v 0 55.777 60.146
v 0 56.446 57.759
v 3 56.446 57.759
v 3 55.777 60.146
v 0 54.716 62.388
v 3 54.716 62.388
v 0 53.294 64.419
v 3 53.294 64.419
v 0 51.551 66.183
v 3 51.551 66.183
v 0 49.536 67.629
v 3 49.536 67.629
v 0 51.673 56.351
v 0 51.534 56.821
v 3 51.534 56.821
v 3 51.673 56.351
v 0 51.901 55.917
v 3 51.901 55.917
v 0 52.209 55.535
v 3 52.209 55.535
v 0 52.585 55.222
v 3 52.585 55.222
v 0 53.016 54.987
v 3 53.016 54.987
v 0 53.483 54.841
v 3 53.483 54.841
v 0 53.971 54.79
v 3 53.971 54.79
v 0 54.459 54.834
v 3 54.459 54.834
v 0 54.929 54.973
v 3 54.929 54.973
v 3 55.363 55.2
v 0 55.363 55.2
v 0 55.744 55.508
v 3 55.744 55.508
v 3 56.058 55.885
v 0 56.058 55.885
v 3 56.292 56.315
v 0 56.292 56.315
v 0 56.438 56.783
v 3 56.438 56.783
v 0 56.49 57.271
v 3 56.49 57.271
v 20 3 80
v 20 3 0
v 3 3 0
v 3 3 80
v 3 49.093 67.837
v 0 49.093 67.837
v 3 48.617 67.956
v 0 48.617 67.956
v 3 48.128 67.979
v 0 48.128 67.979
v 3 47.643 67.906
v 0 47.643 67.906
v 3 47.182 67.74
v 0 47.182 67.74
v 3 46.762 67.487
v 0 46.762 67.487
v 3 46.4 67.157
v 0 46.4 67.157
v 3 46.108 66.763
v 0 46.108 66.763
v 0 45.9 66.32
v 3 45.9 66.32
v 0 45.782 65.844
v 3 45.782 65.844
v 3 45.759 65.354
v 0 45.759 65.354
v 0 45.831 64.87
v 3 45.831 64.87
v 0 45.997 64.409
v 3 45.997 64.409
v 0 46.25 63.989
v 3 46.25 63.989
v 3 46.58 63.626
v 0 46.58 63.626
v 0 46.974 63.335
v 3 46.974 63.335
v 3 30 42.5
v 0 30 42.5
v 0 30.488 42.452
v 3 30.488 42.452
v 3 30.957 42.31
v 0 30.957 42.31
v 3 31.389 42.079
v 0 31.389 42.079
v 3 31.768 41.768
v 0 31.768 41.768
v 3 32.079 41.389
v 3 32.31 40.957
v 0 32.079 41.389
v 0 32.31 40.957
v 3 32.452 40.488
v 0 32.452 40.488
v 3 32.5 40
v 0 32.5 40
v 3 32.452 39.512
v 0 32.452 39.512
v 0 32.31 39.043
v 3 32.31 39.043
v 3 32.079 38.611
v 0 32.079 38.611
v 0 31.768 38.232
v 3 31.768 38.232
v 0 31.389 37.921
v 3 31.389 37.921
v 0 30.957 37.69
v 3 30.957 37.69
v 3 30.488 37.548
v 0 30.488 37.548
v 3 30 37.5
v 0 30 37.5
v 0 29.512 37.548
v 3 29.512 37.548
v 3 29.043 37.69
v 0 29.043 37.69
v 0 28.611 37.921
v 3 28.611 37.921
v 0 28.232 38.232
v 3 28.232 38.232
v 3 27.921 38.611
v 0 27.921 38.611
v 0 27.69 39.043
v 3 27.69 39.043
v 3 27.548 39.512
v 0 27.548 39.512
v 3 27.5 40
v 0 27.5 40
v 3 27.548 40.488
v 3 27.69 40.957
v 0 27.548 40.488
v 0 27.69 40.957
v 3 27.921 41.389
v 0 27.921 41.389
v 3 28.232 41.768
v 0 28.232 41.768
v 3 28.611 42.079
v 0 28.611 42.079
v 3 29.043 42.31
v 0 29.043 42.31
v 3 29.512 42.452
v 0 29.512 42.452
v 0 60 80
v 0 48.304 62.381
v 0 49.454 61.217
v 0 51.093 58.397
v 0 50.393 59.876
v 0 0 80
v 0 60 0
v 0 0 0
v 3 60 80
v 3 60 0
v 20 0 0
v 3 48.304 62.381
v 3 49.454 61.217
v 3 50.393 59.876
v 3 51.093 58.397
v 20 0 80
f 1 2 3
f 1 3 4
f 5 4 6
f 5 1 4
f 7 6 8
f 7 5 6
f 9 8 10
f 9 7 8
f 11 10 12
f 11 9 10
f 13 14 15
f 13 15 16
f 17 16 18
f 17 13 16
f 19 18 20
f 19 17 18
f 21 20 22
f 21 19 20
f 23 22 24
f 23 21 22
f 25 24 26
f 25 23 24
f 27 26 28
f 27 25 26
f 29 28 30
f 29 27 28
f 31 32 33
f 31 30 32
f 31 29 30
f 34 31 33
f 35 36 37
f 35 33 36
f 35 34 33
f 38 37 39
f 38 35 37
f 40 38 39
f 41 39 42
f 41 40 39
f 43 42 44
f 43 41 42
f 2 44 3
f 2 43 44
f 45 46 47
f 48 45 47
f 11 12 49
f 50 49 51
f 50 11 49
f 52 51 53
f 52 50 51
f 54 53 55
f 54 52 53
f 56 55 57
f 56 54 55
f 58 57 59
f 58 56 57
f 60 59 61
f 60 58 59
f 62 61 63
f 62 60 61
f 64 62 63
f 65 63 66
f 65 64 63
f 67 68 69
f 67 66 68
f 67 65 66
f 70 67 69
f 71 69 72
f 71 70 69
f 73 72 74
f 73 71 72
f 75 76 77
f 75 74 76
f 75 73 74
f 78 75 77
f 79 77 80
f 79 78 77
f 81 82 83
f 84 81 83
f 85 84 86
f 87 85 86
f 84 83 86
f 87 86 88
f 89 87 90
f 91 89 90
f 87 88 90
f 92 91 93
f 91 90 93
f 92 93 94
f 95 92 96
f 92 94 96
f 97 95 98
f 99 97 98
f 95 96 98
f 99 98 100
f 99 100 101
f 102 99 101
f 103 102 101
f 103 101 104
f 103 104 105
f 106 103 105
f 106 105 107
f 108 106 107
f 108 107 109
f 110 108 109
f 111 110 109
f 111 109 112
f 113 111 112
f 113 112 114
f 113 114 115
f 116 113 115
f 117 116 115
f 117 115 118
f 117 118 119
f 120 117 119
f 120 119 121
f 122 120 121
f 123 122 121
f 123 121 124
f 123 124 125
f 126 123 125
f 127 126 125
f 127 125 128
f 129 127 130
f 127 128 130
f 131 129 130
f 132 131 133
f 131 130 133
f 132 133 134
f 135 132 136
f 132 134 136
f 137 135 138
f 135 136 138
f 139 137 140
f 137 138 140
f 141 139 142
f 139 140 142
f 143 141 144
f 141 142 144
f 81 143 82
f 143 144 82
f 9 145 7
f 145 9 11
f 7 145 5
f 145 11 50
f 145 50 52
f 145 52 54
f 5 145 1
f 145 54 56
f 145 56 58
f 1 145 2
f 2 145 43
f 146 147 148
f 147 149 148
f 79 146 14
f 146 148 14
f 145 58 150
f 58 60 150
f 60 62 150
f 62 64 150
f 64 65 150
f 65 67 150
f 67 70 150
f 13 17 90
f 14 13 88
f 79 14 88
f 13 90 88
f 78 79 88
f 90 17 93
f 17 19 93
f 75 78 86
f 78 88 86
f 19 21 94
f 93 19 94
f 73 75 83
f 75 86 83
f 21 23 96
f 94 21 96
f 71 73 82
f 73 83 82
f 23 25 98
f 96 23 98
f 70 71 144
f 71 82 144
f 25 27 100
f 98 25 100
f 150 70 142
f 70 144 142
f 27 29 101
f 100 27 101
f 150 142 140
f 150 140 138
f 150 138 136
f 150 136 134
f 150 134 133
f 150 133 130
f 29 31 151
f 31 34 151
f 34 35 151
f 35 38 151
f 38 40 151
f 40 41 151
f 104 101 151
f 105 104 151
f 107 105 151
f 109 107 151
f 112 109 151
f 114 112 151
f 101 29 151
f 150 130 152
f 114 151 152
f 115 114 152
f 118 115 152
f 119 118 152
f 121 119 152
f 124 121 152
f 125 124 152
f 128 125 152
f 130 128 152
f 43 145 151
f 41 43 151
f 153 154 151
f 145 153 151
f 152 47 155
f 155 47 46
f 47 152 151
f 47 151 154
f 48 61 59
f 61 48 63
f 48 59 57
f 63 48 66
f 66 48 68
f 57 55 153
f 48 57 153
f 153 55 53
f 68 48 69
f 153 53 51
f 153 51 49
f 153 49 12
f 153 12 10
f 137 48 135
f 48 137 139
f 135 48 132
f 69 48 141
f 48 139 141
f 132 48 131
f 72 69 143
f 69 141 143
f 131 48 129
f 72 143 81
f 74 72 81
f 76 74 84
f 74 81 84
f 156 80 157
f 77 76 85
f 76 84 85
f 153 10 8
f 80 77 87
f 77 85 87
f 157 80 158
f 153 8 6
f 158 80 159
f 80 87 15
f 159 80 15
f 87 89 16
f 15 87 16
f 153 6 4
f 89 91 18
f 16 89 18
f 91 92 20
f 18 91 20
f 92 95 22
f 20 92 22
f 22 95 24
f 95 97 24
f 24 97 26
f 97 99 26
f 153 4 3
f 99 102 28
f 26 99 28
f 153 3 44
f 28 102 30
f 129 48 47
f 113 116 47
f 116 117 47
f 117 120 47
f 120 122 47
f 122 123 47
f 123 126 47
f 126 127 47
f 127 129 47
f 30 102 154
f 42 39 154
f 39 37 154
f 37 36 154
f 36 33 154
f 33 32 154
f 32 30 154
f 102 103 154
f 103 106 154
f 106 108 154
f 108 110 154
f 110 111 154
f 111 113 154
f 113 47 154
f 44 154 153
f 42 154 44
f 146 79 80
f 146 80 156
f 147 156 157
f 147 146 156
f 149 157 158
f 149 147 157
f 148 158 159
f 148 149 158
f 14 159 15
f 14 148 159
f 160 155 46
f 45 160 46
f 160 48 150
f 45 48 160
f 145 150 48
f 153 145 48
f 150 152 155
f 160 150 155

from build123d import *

# Parameters (mm, degrees)
BOSS_EXTRUDE1_DEPTH = 80
SKETCH2_R           = 2.5
CUT_EXTRUDE1_DEPTH  = 21
CUT_EXTRUDE2_DEPTH  = 10


with BuildPart() as part:
    # Sketch1 → Boss-Extrude1 (new body)
    with BuildSketch(Plane.XY):
        Polygon((0, 0), (20, 0), (20, 3), (3, 3), (3, 60), (0, 60), align=None)
    extrude(amount=BOSS_EXTRUDE1_DEPTH)

    # Sketch2 → Cut-Extrude1 (cut, through all)
    with BuildSketch(Plane.ZY):
        with Locations((40, 30)):
            Circle(SKETCH2_R)
    extrude(amount=-CUT_EXTRUDE1_DEPTH, mode=Mode.SUBTRACT)

    # Sketch3 → Cut-Extrude2 (cut)
    with BuildSketch(Plane.ZY):
        with BuildLine():
            ThreePointArc((57.758584744, 56.445517931), (63.433655861, 54.048079801), (67.628756298, 49.536397843))
            ThreePointArc((67.628756298, 49.536397843), (66.763094992, 46.108478576), (63.335175725, 46.974139881))
            ThreePointArc((63.335175725, 46.974139881), (60.566344139, 49.951920199), (56.820708869, 51.534266681))
            ThreePointArc((56.820708869, 51.534266681), (54.834021181, 54.458830243), (57.758584744, 56.445517931))
        make_face()
    extrude(amount=-CUT_EXTRUDE2_DEPTH, mode=Mode.SUBTRACT)


solid = part.part
